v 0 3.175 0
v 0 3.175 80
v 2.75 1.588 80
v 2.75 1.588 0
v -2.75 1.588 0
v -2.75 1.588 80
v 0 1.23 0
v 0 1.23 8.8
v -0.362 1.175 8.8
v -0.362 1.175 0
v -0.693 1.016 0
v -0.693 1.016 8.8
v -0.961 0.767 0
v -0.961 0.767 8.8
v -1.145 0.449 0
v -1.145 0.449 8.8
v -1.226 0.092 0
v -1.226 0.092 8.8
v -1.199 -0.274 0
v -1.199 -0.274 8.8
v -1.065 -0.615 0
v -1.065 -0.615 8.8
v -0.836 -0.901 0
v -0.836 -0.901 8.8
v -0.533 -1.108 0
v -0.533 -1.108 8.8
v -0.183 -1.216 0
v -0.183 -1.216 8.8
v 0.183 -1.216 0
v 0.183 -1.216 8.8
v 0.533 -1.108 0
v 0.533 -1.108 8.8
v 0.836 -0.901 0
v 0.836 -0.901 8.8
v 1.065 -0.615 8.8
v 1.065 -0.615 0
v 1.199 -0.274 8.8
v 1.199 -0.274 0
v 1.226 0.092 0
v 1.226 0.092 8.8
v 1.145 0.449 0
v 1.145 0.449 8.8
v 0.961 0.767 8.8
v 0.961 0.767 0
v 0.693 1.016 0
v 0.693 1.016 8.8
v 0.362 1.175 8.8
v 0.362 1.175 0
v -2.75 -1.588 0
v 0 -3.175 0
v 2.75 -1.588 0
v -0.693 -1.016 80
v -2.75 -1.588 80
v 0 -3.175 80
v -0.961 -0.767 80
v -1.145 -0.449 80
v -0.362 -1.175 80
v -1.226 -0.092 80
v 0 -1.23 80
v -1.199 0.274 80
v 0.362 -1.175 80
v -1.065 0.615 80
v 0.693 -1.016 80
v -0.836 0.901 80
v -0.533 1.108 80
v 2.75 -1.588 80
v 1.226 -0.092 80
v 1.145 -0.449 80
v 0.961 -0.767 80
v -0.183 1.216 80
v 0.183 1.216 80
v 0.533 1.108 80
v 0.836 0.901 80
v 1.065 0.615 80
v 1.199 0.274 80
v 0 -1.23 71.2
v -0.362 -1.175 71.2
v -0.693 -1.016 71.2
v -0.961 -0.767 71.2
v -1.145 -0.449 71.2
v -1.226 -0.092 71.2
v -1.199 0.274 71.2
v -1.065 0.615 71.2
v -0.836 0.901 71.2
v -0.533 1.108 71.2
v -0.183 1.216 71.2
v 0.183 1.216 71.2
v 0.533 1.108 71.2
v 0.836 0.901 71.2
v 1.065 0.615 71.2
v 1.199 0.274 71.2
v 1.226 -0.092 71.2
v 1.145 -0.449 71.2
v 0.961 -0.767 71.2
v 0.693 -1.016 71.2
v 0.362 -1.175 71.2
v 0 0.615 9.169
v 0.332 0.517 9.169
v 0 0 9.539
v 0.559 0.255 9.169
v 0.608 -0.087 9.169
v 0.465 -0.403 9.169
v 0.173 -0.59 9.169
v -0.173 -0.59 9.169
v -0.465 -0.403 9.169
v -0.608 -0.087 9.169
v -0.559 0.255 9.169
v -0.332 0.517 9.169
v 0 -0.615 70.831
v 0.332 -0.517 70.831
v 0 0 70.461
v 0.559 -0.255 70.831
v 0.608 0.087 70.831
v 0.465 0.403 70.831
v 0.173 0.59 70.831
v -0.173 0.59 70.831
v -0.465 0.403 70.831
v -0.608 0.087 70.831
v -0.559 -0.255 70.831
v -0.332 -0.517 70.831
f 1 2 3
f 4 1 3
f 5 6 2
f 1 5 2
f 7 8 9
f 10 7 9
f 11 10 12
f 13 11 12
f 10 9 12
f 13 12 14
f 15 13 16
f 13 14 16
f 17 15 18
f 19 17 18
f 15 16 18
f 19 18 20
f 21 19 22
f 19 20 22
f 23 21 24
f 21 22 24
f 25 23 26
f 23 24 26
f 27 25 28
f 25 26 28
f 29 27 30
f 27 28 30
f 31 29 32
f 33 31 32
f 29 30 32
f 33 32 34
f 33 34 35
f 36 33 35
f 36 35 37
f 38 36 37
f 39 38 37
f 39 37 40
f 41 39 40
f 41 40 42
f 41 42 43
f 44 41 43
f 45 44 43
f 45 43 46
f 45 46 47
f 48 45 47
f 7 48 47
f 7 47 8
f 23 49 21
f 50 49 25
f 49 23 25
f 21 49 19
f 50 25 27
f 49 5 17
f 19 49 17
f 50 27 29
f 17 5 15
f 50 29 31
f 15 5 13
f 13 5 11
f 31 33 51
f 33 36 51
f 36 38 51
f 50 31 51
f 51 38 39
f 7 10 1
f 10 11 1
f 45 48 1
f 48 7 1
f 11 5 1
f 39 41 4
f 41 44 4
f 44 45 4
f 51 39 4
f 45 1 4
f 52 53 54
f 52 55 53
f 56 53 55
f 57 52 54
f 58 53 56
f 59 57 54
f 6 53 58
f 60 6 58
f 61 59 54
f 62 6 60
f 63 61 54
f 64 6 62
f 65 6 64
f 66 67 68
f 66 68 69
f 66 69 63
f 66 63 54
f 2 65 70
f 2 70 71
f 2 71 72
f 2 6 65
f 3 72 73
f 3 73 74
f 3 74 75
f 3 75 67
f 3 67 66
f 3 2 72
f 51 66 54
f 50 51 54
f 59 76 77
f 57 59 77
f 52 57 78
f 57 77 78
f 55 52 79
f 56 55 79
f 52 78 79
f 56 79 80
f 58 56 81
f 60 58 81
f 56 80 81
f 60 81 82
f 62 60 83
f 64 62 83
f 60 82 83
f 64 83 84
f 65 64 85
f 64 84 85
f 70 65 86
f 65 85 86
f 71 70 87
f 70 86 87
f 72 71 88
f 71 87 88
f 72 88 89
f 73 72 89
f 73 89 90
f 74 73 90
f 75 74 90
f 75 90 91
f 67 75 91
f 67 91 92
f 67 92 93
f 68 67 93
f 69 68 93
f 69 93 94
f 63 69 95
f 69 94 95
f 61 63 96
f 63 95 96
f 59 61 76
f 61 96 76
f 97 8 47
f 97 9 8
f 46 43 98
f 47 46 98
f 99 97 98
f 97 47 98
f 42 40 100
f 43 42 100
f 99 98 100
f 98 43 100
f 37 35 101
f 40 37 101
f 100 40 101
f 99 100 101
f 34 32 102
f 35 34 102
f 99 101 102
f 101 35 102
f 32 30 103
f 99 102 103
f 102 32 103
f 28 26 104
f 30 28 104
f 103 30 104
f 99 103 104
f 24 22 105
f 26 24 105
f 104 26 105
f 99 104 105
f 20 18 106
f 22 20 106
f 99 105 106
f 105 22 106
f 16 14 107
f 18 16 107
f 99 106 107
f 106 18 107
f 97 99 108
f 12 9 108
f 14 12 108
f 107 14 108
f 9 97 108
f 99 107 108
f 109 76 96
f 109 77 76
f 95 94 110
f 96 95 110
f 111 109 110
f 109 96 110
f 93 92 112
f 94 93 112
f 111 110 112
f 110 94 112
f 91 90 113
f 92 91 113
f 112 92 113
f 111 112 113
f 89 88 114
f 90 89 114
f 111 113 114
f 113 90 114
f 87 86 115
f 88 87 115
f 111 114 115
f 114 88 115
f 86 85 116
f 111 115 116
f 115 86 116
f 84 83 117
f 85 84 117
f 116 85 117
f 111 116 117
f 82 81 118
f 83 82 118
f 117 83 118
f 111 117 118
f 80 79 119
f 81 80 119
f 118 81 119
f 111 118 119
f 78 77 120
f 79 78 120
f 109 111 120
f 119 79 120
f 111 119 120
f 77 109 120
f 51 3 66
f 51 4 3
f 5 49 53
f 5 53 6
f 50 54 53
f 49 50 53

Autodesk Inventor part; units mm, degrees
ref_plane "YZ Plane" through (0, 0, 0) normal (1, 0, 0) x (0, 1, 0)
ref_plane "XZ Plane" through (0, 0, 0) normal (0, 1, 0) x (-1, 0, 0)
ref_plane "XY Plane" through (0, 0, 0) normal (0, 0, 1) x (1, 0, 0)
sketch "スケッチ1" plane through (0, 0, 0) normal (0, 0, 1) x (1, 0, 0)
  line L0 (0, 3.1754) -> (2.75, 1.5877)
  line L1 (2.75, 1.5877) -> (2.75, -1.5877)
  line L2 (2.75, -1.5877) -> (0, -3.1754)
  line L3 (0, -3.1754) -> (-2.75, -1.5877)
  line L4 (-2.75, -1.5877) -> (-2.75, 1.5877)
  line L5 (-2.75, 1.5877) -> (0, 3.1754)
  point P0 (0, 0)
  point P1 (0, 0)
  dimension "d0" = 5.5
extrude "押し出し1" add sketch "スケッチ1" along normal blind 80
sketch "スケッチ2" plane through (0, 0, 80) normal (0, 0, 1) x (1, 0, 0)
  point P0 (0, 0)
hole "穴1" at (0, 0, 80) direction (0, 0, -1) diameter 2.459 depth 8.8 tip angle 118 thread size "M3x0.5" class "6H" standard "ISO Metric profile"
sketch "スケッチ3" plane through (0, 0, 0) normal (0, 0, -1) x (-1, 0, 0)
  point P0 (0, 0)
hole "穴2" at (0, 0, 0) direction (0, 0, 1) diameter 2.459 depth 8.8 tip angle 118 thread size "M3x0.5" class "6H" standard "ISO Metric profile"
properties part number "アルミスペーサー(六角・酸洗処理）_ASL-380E" material "アルミニウム 6061"
